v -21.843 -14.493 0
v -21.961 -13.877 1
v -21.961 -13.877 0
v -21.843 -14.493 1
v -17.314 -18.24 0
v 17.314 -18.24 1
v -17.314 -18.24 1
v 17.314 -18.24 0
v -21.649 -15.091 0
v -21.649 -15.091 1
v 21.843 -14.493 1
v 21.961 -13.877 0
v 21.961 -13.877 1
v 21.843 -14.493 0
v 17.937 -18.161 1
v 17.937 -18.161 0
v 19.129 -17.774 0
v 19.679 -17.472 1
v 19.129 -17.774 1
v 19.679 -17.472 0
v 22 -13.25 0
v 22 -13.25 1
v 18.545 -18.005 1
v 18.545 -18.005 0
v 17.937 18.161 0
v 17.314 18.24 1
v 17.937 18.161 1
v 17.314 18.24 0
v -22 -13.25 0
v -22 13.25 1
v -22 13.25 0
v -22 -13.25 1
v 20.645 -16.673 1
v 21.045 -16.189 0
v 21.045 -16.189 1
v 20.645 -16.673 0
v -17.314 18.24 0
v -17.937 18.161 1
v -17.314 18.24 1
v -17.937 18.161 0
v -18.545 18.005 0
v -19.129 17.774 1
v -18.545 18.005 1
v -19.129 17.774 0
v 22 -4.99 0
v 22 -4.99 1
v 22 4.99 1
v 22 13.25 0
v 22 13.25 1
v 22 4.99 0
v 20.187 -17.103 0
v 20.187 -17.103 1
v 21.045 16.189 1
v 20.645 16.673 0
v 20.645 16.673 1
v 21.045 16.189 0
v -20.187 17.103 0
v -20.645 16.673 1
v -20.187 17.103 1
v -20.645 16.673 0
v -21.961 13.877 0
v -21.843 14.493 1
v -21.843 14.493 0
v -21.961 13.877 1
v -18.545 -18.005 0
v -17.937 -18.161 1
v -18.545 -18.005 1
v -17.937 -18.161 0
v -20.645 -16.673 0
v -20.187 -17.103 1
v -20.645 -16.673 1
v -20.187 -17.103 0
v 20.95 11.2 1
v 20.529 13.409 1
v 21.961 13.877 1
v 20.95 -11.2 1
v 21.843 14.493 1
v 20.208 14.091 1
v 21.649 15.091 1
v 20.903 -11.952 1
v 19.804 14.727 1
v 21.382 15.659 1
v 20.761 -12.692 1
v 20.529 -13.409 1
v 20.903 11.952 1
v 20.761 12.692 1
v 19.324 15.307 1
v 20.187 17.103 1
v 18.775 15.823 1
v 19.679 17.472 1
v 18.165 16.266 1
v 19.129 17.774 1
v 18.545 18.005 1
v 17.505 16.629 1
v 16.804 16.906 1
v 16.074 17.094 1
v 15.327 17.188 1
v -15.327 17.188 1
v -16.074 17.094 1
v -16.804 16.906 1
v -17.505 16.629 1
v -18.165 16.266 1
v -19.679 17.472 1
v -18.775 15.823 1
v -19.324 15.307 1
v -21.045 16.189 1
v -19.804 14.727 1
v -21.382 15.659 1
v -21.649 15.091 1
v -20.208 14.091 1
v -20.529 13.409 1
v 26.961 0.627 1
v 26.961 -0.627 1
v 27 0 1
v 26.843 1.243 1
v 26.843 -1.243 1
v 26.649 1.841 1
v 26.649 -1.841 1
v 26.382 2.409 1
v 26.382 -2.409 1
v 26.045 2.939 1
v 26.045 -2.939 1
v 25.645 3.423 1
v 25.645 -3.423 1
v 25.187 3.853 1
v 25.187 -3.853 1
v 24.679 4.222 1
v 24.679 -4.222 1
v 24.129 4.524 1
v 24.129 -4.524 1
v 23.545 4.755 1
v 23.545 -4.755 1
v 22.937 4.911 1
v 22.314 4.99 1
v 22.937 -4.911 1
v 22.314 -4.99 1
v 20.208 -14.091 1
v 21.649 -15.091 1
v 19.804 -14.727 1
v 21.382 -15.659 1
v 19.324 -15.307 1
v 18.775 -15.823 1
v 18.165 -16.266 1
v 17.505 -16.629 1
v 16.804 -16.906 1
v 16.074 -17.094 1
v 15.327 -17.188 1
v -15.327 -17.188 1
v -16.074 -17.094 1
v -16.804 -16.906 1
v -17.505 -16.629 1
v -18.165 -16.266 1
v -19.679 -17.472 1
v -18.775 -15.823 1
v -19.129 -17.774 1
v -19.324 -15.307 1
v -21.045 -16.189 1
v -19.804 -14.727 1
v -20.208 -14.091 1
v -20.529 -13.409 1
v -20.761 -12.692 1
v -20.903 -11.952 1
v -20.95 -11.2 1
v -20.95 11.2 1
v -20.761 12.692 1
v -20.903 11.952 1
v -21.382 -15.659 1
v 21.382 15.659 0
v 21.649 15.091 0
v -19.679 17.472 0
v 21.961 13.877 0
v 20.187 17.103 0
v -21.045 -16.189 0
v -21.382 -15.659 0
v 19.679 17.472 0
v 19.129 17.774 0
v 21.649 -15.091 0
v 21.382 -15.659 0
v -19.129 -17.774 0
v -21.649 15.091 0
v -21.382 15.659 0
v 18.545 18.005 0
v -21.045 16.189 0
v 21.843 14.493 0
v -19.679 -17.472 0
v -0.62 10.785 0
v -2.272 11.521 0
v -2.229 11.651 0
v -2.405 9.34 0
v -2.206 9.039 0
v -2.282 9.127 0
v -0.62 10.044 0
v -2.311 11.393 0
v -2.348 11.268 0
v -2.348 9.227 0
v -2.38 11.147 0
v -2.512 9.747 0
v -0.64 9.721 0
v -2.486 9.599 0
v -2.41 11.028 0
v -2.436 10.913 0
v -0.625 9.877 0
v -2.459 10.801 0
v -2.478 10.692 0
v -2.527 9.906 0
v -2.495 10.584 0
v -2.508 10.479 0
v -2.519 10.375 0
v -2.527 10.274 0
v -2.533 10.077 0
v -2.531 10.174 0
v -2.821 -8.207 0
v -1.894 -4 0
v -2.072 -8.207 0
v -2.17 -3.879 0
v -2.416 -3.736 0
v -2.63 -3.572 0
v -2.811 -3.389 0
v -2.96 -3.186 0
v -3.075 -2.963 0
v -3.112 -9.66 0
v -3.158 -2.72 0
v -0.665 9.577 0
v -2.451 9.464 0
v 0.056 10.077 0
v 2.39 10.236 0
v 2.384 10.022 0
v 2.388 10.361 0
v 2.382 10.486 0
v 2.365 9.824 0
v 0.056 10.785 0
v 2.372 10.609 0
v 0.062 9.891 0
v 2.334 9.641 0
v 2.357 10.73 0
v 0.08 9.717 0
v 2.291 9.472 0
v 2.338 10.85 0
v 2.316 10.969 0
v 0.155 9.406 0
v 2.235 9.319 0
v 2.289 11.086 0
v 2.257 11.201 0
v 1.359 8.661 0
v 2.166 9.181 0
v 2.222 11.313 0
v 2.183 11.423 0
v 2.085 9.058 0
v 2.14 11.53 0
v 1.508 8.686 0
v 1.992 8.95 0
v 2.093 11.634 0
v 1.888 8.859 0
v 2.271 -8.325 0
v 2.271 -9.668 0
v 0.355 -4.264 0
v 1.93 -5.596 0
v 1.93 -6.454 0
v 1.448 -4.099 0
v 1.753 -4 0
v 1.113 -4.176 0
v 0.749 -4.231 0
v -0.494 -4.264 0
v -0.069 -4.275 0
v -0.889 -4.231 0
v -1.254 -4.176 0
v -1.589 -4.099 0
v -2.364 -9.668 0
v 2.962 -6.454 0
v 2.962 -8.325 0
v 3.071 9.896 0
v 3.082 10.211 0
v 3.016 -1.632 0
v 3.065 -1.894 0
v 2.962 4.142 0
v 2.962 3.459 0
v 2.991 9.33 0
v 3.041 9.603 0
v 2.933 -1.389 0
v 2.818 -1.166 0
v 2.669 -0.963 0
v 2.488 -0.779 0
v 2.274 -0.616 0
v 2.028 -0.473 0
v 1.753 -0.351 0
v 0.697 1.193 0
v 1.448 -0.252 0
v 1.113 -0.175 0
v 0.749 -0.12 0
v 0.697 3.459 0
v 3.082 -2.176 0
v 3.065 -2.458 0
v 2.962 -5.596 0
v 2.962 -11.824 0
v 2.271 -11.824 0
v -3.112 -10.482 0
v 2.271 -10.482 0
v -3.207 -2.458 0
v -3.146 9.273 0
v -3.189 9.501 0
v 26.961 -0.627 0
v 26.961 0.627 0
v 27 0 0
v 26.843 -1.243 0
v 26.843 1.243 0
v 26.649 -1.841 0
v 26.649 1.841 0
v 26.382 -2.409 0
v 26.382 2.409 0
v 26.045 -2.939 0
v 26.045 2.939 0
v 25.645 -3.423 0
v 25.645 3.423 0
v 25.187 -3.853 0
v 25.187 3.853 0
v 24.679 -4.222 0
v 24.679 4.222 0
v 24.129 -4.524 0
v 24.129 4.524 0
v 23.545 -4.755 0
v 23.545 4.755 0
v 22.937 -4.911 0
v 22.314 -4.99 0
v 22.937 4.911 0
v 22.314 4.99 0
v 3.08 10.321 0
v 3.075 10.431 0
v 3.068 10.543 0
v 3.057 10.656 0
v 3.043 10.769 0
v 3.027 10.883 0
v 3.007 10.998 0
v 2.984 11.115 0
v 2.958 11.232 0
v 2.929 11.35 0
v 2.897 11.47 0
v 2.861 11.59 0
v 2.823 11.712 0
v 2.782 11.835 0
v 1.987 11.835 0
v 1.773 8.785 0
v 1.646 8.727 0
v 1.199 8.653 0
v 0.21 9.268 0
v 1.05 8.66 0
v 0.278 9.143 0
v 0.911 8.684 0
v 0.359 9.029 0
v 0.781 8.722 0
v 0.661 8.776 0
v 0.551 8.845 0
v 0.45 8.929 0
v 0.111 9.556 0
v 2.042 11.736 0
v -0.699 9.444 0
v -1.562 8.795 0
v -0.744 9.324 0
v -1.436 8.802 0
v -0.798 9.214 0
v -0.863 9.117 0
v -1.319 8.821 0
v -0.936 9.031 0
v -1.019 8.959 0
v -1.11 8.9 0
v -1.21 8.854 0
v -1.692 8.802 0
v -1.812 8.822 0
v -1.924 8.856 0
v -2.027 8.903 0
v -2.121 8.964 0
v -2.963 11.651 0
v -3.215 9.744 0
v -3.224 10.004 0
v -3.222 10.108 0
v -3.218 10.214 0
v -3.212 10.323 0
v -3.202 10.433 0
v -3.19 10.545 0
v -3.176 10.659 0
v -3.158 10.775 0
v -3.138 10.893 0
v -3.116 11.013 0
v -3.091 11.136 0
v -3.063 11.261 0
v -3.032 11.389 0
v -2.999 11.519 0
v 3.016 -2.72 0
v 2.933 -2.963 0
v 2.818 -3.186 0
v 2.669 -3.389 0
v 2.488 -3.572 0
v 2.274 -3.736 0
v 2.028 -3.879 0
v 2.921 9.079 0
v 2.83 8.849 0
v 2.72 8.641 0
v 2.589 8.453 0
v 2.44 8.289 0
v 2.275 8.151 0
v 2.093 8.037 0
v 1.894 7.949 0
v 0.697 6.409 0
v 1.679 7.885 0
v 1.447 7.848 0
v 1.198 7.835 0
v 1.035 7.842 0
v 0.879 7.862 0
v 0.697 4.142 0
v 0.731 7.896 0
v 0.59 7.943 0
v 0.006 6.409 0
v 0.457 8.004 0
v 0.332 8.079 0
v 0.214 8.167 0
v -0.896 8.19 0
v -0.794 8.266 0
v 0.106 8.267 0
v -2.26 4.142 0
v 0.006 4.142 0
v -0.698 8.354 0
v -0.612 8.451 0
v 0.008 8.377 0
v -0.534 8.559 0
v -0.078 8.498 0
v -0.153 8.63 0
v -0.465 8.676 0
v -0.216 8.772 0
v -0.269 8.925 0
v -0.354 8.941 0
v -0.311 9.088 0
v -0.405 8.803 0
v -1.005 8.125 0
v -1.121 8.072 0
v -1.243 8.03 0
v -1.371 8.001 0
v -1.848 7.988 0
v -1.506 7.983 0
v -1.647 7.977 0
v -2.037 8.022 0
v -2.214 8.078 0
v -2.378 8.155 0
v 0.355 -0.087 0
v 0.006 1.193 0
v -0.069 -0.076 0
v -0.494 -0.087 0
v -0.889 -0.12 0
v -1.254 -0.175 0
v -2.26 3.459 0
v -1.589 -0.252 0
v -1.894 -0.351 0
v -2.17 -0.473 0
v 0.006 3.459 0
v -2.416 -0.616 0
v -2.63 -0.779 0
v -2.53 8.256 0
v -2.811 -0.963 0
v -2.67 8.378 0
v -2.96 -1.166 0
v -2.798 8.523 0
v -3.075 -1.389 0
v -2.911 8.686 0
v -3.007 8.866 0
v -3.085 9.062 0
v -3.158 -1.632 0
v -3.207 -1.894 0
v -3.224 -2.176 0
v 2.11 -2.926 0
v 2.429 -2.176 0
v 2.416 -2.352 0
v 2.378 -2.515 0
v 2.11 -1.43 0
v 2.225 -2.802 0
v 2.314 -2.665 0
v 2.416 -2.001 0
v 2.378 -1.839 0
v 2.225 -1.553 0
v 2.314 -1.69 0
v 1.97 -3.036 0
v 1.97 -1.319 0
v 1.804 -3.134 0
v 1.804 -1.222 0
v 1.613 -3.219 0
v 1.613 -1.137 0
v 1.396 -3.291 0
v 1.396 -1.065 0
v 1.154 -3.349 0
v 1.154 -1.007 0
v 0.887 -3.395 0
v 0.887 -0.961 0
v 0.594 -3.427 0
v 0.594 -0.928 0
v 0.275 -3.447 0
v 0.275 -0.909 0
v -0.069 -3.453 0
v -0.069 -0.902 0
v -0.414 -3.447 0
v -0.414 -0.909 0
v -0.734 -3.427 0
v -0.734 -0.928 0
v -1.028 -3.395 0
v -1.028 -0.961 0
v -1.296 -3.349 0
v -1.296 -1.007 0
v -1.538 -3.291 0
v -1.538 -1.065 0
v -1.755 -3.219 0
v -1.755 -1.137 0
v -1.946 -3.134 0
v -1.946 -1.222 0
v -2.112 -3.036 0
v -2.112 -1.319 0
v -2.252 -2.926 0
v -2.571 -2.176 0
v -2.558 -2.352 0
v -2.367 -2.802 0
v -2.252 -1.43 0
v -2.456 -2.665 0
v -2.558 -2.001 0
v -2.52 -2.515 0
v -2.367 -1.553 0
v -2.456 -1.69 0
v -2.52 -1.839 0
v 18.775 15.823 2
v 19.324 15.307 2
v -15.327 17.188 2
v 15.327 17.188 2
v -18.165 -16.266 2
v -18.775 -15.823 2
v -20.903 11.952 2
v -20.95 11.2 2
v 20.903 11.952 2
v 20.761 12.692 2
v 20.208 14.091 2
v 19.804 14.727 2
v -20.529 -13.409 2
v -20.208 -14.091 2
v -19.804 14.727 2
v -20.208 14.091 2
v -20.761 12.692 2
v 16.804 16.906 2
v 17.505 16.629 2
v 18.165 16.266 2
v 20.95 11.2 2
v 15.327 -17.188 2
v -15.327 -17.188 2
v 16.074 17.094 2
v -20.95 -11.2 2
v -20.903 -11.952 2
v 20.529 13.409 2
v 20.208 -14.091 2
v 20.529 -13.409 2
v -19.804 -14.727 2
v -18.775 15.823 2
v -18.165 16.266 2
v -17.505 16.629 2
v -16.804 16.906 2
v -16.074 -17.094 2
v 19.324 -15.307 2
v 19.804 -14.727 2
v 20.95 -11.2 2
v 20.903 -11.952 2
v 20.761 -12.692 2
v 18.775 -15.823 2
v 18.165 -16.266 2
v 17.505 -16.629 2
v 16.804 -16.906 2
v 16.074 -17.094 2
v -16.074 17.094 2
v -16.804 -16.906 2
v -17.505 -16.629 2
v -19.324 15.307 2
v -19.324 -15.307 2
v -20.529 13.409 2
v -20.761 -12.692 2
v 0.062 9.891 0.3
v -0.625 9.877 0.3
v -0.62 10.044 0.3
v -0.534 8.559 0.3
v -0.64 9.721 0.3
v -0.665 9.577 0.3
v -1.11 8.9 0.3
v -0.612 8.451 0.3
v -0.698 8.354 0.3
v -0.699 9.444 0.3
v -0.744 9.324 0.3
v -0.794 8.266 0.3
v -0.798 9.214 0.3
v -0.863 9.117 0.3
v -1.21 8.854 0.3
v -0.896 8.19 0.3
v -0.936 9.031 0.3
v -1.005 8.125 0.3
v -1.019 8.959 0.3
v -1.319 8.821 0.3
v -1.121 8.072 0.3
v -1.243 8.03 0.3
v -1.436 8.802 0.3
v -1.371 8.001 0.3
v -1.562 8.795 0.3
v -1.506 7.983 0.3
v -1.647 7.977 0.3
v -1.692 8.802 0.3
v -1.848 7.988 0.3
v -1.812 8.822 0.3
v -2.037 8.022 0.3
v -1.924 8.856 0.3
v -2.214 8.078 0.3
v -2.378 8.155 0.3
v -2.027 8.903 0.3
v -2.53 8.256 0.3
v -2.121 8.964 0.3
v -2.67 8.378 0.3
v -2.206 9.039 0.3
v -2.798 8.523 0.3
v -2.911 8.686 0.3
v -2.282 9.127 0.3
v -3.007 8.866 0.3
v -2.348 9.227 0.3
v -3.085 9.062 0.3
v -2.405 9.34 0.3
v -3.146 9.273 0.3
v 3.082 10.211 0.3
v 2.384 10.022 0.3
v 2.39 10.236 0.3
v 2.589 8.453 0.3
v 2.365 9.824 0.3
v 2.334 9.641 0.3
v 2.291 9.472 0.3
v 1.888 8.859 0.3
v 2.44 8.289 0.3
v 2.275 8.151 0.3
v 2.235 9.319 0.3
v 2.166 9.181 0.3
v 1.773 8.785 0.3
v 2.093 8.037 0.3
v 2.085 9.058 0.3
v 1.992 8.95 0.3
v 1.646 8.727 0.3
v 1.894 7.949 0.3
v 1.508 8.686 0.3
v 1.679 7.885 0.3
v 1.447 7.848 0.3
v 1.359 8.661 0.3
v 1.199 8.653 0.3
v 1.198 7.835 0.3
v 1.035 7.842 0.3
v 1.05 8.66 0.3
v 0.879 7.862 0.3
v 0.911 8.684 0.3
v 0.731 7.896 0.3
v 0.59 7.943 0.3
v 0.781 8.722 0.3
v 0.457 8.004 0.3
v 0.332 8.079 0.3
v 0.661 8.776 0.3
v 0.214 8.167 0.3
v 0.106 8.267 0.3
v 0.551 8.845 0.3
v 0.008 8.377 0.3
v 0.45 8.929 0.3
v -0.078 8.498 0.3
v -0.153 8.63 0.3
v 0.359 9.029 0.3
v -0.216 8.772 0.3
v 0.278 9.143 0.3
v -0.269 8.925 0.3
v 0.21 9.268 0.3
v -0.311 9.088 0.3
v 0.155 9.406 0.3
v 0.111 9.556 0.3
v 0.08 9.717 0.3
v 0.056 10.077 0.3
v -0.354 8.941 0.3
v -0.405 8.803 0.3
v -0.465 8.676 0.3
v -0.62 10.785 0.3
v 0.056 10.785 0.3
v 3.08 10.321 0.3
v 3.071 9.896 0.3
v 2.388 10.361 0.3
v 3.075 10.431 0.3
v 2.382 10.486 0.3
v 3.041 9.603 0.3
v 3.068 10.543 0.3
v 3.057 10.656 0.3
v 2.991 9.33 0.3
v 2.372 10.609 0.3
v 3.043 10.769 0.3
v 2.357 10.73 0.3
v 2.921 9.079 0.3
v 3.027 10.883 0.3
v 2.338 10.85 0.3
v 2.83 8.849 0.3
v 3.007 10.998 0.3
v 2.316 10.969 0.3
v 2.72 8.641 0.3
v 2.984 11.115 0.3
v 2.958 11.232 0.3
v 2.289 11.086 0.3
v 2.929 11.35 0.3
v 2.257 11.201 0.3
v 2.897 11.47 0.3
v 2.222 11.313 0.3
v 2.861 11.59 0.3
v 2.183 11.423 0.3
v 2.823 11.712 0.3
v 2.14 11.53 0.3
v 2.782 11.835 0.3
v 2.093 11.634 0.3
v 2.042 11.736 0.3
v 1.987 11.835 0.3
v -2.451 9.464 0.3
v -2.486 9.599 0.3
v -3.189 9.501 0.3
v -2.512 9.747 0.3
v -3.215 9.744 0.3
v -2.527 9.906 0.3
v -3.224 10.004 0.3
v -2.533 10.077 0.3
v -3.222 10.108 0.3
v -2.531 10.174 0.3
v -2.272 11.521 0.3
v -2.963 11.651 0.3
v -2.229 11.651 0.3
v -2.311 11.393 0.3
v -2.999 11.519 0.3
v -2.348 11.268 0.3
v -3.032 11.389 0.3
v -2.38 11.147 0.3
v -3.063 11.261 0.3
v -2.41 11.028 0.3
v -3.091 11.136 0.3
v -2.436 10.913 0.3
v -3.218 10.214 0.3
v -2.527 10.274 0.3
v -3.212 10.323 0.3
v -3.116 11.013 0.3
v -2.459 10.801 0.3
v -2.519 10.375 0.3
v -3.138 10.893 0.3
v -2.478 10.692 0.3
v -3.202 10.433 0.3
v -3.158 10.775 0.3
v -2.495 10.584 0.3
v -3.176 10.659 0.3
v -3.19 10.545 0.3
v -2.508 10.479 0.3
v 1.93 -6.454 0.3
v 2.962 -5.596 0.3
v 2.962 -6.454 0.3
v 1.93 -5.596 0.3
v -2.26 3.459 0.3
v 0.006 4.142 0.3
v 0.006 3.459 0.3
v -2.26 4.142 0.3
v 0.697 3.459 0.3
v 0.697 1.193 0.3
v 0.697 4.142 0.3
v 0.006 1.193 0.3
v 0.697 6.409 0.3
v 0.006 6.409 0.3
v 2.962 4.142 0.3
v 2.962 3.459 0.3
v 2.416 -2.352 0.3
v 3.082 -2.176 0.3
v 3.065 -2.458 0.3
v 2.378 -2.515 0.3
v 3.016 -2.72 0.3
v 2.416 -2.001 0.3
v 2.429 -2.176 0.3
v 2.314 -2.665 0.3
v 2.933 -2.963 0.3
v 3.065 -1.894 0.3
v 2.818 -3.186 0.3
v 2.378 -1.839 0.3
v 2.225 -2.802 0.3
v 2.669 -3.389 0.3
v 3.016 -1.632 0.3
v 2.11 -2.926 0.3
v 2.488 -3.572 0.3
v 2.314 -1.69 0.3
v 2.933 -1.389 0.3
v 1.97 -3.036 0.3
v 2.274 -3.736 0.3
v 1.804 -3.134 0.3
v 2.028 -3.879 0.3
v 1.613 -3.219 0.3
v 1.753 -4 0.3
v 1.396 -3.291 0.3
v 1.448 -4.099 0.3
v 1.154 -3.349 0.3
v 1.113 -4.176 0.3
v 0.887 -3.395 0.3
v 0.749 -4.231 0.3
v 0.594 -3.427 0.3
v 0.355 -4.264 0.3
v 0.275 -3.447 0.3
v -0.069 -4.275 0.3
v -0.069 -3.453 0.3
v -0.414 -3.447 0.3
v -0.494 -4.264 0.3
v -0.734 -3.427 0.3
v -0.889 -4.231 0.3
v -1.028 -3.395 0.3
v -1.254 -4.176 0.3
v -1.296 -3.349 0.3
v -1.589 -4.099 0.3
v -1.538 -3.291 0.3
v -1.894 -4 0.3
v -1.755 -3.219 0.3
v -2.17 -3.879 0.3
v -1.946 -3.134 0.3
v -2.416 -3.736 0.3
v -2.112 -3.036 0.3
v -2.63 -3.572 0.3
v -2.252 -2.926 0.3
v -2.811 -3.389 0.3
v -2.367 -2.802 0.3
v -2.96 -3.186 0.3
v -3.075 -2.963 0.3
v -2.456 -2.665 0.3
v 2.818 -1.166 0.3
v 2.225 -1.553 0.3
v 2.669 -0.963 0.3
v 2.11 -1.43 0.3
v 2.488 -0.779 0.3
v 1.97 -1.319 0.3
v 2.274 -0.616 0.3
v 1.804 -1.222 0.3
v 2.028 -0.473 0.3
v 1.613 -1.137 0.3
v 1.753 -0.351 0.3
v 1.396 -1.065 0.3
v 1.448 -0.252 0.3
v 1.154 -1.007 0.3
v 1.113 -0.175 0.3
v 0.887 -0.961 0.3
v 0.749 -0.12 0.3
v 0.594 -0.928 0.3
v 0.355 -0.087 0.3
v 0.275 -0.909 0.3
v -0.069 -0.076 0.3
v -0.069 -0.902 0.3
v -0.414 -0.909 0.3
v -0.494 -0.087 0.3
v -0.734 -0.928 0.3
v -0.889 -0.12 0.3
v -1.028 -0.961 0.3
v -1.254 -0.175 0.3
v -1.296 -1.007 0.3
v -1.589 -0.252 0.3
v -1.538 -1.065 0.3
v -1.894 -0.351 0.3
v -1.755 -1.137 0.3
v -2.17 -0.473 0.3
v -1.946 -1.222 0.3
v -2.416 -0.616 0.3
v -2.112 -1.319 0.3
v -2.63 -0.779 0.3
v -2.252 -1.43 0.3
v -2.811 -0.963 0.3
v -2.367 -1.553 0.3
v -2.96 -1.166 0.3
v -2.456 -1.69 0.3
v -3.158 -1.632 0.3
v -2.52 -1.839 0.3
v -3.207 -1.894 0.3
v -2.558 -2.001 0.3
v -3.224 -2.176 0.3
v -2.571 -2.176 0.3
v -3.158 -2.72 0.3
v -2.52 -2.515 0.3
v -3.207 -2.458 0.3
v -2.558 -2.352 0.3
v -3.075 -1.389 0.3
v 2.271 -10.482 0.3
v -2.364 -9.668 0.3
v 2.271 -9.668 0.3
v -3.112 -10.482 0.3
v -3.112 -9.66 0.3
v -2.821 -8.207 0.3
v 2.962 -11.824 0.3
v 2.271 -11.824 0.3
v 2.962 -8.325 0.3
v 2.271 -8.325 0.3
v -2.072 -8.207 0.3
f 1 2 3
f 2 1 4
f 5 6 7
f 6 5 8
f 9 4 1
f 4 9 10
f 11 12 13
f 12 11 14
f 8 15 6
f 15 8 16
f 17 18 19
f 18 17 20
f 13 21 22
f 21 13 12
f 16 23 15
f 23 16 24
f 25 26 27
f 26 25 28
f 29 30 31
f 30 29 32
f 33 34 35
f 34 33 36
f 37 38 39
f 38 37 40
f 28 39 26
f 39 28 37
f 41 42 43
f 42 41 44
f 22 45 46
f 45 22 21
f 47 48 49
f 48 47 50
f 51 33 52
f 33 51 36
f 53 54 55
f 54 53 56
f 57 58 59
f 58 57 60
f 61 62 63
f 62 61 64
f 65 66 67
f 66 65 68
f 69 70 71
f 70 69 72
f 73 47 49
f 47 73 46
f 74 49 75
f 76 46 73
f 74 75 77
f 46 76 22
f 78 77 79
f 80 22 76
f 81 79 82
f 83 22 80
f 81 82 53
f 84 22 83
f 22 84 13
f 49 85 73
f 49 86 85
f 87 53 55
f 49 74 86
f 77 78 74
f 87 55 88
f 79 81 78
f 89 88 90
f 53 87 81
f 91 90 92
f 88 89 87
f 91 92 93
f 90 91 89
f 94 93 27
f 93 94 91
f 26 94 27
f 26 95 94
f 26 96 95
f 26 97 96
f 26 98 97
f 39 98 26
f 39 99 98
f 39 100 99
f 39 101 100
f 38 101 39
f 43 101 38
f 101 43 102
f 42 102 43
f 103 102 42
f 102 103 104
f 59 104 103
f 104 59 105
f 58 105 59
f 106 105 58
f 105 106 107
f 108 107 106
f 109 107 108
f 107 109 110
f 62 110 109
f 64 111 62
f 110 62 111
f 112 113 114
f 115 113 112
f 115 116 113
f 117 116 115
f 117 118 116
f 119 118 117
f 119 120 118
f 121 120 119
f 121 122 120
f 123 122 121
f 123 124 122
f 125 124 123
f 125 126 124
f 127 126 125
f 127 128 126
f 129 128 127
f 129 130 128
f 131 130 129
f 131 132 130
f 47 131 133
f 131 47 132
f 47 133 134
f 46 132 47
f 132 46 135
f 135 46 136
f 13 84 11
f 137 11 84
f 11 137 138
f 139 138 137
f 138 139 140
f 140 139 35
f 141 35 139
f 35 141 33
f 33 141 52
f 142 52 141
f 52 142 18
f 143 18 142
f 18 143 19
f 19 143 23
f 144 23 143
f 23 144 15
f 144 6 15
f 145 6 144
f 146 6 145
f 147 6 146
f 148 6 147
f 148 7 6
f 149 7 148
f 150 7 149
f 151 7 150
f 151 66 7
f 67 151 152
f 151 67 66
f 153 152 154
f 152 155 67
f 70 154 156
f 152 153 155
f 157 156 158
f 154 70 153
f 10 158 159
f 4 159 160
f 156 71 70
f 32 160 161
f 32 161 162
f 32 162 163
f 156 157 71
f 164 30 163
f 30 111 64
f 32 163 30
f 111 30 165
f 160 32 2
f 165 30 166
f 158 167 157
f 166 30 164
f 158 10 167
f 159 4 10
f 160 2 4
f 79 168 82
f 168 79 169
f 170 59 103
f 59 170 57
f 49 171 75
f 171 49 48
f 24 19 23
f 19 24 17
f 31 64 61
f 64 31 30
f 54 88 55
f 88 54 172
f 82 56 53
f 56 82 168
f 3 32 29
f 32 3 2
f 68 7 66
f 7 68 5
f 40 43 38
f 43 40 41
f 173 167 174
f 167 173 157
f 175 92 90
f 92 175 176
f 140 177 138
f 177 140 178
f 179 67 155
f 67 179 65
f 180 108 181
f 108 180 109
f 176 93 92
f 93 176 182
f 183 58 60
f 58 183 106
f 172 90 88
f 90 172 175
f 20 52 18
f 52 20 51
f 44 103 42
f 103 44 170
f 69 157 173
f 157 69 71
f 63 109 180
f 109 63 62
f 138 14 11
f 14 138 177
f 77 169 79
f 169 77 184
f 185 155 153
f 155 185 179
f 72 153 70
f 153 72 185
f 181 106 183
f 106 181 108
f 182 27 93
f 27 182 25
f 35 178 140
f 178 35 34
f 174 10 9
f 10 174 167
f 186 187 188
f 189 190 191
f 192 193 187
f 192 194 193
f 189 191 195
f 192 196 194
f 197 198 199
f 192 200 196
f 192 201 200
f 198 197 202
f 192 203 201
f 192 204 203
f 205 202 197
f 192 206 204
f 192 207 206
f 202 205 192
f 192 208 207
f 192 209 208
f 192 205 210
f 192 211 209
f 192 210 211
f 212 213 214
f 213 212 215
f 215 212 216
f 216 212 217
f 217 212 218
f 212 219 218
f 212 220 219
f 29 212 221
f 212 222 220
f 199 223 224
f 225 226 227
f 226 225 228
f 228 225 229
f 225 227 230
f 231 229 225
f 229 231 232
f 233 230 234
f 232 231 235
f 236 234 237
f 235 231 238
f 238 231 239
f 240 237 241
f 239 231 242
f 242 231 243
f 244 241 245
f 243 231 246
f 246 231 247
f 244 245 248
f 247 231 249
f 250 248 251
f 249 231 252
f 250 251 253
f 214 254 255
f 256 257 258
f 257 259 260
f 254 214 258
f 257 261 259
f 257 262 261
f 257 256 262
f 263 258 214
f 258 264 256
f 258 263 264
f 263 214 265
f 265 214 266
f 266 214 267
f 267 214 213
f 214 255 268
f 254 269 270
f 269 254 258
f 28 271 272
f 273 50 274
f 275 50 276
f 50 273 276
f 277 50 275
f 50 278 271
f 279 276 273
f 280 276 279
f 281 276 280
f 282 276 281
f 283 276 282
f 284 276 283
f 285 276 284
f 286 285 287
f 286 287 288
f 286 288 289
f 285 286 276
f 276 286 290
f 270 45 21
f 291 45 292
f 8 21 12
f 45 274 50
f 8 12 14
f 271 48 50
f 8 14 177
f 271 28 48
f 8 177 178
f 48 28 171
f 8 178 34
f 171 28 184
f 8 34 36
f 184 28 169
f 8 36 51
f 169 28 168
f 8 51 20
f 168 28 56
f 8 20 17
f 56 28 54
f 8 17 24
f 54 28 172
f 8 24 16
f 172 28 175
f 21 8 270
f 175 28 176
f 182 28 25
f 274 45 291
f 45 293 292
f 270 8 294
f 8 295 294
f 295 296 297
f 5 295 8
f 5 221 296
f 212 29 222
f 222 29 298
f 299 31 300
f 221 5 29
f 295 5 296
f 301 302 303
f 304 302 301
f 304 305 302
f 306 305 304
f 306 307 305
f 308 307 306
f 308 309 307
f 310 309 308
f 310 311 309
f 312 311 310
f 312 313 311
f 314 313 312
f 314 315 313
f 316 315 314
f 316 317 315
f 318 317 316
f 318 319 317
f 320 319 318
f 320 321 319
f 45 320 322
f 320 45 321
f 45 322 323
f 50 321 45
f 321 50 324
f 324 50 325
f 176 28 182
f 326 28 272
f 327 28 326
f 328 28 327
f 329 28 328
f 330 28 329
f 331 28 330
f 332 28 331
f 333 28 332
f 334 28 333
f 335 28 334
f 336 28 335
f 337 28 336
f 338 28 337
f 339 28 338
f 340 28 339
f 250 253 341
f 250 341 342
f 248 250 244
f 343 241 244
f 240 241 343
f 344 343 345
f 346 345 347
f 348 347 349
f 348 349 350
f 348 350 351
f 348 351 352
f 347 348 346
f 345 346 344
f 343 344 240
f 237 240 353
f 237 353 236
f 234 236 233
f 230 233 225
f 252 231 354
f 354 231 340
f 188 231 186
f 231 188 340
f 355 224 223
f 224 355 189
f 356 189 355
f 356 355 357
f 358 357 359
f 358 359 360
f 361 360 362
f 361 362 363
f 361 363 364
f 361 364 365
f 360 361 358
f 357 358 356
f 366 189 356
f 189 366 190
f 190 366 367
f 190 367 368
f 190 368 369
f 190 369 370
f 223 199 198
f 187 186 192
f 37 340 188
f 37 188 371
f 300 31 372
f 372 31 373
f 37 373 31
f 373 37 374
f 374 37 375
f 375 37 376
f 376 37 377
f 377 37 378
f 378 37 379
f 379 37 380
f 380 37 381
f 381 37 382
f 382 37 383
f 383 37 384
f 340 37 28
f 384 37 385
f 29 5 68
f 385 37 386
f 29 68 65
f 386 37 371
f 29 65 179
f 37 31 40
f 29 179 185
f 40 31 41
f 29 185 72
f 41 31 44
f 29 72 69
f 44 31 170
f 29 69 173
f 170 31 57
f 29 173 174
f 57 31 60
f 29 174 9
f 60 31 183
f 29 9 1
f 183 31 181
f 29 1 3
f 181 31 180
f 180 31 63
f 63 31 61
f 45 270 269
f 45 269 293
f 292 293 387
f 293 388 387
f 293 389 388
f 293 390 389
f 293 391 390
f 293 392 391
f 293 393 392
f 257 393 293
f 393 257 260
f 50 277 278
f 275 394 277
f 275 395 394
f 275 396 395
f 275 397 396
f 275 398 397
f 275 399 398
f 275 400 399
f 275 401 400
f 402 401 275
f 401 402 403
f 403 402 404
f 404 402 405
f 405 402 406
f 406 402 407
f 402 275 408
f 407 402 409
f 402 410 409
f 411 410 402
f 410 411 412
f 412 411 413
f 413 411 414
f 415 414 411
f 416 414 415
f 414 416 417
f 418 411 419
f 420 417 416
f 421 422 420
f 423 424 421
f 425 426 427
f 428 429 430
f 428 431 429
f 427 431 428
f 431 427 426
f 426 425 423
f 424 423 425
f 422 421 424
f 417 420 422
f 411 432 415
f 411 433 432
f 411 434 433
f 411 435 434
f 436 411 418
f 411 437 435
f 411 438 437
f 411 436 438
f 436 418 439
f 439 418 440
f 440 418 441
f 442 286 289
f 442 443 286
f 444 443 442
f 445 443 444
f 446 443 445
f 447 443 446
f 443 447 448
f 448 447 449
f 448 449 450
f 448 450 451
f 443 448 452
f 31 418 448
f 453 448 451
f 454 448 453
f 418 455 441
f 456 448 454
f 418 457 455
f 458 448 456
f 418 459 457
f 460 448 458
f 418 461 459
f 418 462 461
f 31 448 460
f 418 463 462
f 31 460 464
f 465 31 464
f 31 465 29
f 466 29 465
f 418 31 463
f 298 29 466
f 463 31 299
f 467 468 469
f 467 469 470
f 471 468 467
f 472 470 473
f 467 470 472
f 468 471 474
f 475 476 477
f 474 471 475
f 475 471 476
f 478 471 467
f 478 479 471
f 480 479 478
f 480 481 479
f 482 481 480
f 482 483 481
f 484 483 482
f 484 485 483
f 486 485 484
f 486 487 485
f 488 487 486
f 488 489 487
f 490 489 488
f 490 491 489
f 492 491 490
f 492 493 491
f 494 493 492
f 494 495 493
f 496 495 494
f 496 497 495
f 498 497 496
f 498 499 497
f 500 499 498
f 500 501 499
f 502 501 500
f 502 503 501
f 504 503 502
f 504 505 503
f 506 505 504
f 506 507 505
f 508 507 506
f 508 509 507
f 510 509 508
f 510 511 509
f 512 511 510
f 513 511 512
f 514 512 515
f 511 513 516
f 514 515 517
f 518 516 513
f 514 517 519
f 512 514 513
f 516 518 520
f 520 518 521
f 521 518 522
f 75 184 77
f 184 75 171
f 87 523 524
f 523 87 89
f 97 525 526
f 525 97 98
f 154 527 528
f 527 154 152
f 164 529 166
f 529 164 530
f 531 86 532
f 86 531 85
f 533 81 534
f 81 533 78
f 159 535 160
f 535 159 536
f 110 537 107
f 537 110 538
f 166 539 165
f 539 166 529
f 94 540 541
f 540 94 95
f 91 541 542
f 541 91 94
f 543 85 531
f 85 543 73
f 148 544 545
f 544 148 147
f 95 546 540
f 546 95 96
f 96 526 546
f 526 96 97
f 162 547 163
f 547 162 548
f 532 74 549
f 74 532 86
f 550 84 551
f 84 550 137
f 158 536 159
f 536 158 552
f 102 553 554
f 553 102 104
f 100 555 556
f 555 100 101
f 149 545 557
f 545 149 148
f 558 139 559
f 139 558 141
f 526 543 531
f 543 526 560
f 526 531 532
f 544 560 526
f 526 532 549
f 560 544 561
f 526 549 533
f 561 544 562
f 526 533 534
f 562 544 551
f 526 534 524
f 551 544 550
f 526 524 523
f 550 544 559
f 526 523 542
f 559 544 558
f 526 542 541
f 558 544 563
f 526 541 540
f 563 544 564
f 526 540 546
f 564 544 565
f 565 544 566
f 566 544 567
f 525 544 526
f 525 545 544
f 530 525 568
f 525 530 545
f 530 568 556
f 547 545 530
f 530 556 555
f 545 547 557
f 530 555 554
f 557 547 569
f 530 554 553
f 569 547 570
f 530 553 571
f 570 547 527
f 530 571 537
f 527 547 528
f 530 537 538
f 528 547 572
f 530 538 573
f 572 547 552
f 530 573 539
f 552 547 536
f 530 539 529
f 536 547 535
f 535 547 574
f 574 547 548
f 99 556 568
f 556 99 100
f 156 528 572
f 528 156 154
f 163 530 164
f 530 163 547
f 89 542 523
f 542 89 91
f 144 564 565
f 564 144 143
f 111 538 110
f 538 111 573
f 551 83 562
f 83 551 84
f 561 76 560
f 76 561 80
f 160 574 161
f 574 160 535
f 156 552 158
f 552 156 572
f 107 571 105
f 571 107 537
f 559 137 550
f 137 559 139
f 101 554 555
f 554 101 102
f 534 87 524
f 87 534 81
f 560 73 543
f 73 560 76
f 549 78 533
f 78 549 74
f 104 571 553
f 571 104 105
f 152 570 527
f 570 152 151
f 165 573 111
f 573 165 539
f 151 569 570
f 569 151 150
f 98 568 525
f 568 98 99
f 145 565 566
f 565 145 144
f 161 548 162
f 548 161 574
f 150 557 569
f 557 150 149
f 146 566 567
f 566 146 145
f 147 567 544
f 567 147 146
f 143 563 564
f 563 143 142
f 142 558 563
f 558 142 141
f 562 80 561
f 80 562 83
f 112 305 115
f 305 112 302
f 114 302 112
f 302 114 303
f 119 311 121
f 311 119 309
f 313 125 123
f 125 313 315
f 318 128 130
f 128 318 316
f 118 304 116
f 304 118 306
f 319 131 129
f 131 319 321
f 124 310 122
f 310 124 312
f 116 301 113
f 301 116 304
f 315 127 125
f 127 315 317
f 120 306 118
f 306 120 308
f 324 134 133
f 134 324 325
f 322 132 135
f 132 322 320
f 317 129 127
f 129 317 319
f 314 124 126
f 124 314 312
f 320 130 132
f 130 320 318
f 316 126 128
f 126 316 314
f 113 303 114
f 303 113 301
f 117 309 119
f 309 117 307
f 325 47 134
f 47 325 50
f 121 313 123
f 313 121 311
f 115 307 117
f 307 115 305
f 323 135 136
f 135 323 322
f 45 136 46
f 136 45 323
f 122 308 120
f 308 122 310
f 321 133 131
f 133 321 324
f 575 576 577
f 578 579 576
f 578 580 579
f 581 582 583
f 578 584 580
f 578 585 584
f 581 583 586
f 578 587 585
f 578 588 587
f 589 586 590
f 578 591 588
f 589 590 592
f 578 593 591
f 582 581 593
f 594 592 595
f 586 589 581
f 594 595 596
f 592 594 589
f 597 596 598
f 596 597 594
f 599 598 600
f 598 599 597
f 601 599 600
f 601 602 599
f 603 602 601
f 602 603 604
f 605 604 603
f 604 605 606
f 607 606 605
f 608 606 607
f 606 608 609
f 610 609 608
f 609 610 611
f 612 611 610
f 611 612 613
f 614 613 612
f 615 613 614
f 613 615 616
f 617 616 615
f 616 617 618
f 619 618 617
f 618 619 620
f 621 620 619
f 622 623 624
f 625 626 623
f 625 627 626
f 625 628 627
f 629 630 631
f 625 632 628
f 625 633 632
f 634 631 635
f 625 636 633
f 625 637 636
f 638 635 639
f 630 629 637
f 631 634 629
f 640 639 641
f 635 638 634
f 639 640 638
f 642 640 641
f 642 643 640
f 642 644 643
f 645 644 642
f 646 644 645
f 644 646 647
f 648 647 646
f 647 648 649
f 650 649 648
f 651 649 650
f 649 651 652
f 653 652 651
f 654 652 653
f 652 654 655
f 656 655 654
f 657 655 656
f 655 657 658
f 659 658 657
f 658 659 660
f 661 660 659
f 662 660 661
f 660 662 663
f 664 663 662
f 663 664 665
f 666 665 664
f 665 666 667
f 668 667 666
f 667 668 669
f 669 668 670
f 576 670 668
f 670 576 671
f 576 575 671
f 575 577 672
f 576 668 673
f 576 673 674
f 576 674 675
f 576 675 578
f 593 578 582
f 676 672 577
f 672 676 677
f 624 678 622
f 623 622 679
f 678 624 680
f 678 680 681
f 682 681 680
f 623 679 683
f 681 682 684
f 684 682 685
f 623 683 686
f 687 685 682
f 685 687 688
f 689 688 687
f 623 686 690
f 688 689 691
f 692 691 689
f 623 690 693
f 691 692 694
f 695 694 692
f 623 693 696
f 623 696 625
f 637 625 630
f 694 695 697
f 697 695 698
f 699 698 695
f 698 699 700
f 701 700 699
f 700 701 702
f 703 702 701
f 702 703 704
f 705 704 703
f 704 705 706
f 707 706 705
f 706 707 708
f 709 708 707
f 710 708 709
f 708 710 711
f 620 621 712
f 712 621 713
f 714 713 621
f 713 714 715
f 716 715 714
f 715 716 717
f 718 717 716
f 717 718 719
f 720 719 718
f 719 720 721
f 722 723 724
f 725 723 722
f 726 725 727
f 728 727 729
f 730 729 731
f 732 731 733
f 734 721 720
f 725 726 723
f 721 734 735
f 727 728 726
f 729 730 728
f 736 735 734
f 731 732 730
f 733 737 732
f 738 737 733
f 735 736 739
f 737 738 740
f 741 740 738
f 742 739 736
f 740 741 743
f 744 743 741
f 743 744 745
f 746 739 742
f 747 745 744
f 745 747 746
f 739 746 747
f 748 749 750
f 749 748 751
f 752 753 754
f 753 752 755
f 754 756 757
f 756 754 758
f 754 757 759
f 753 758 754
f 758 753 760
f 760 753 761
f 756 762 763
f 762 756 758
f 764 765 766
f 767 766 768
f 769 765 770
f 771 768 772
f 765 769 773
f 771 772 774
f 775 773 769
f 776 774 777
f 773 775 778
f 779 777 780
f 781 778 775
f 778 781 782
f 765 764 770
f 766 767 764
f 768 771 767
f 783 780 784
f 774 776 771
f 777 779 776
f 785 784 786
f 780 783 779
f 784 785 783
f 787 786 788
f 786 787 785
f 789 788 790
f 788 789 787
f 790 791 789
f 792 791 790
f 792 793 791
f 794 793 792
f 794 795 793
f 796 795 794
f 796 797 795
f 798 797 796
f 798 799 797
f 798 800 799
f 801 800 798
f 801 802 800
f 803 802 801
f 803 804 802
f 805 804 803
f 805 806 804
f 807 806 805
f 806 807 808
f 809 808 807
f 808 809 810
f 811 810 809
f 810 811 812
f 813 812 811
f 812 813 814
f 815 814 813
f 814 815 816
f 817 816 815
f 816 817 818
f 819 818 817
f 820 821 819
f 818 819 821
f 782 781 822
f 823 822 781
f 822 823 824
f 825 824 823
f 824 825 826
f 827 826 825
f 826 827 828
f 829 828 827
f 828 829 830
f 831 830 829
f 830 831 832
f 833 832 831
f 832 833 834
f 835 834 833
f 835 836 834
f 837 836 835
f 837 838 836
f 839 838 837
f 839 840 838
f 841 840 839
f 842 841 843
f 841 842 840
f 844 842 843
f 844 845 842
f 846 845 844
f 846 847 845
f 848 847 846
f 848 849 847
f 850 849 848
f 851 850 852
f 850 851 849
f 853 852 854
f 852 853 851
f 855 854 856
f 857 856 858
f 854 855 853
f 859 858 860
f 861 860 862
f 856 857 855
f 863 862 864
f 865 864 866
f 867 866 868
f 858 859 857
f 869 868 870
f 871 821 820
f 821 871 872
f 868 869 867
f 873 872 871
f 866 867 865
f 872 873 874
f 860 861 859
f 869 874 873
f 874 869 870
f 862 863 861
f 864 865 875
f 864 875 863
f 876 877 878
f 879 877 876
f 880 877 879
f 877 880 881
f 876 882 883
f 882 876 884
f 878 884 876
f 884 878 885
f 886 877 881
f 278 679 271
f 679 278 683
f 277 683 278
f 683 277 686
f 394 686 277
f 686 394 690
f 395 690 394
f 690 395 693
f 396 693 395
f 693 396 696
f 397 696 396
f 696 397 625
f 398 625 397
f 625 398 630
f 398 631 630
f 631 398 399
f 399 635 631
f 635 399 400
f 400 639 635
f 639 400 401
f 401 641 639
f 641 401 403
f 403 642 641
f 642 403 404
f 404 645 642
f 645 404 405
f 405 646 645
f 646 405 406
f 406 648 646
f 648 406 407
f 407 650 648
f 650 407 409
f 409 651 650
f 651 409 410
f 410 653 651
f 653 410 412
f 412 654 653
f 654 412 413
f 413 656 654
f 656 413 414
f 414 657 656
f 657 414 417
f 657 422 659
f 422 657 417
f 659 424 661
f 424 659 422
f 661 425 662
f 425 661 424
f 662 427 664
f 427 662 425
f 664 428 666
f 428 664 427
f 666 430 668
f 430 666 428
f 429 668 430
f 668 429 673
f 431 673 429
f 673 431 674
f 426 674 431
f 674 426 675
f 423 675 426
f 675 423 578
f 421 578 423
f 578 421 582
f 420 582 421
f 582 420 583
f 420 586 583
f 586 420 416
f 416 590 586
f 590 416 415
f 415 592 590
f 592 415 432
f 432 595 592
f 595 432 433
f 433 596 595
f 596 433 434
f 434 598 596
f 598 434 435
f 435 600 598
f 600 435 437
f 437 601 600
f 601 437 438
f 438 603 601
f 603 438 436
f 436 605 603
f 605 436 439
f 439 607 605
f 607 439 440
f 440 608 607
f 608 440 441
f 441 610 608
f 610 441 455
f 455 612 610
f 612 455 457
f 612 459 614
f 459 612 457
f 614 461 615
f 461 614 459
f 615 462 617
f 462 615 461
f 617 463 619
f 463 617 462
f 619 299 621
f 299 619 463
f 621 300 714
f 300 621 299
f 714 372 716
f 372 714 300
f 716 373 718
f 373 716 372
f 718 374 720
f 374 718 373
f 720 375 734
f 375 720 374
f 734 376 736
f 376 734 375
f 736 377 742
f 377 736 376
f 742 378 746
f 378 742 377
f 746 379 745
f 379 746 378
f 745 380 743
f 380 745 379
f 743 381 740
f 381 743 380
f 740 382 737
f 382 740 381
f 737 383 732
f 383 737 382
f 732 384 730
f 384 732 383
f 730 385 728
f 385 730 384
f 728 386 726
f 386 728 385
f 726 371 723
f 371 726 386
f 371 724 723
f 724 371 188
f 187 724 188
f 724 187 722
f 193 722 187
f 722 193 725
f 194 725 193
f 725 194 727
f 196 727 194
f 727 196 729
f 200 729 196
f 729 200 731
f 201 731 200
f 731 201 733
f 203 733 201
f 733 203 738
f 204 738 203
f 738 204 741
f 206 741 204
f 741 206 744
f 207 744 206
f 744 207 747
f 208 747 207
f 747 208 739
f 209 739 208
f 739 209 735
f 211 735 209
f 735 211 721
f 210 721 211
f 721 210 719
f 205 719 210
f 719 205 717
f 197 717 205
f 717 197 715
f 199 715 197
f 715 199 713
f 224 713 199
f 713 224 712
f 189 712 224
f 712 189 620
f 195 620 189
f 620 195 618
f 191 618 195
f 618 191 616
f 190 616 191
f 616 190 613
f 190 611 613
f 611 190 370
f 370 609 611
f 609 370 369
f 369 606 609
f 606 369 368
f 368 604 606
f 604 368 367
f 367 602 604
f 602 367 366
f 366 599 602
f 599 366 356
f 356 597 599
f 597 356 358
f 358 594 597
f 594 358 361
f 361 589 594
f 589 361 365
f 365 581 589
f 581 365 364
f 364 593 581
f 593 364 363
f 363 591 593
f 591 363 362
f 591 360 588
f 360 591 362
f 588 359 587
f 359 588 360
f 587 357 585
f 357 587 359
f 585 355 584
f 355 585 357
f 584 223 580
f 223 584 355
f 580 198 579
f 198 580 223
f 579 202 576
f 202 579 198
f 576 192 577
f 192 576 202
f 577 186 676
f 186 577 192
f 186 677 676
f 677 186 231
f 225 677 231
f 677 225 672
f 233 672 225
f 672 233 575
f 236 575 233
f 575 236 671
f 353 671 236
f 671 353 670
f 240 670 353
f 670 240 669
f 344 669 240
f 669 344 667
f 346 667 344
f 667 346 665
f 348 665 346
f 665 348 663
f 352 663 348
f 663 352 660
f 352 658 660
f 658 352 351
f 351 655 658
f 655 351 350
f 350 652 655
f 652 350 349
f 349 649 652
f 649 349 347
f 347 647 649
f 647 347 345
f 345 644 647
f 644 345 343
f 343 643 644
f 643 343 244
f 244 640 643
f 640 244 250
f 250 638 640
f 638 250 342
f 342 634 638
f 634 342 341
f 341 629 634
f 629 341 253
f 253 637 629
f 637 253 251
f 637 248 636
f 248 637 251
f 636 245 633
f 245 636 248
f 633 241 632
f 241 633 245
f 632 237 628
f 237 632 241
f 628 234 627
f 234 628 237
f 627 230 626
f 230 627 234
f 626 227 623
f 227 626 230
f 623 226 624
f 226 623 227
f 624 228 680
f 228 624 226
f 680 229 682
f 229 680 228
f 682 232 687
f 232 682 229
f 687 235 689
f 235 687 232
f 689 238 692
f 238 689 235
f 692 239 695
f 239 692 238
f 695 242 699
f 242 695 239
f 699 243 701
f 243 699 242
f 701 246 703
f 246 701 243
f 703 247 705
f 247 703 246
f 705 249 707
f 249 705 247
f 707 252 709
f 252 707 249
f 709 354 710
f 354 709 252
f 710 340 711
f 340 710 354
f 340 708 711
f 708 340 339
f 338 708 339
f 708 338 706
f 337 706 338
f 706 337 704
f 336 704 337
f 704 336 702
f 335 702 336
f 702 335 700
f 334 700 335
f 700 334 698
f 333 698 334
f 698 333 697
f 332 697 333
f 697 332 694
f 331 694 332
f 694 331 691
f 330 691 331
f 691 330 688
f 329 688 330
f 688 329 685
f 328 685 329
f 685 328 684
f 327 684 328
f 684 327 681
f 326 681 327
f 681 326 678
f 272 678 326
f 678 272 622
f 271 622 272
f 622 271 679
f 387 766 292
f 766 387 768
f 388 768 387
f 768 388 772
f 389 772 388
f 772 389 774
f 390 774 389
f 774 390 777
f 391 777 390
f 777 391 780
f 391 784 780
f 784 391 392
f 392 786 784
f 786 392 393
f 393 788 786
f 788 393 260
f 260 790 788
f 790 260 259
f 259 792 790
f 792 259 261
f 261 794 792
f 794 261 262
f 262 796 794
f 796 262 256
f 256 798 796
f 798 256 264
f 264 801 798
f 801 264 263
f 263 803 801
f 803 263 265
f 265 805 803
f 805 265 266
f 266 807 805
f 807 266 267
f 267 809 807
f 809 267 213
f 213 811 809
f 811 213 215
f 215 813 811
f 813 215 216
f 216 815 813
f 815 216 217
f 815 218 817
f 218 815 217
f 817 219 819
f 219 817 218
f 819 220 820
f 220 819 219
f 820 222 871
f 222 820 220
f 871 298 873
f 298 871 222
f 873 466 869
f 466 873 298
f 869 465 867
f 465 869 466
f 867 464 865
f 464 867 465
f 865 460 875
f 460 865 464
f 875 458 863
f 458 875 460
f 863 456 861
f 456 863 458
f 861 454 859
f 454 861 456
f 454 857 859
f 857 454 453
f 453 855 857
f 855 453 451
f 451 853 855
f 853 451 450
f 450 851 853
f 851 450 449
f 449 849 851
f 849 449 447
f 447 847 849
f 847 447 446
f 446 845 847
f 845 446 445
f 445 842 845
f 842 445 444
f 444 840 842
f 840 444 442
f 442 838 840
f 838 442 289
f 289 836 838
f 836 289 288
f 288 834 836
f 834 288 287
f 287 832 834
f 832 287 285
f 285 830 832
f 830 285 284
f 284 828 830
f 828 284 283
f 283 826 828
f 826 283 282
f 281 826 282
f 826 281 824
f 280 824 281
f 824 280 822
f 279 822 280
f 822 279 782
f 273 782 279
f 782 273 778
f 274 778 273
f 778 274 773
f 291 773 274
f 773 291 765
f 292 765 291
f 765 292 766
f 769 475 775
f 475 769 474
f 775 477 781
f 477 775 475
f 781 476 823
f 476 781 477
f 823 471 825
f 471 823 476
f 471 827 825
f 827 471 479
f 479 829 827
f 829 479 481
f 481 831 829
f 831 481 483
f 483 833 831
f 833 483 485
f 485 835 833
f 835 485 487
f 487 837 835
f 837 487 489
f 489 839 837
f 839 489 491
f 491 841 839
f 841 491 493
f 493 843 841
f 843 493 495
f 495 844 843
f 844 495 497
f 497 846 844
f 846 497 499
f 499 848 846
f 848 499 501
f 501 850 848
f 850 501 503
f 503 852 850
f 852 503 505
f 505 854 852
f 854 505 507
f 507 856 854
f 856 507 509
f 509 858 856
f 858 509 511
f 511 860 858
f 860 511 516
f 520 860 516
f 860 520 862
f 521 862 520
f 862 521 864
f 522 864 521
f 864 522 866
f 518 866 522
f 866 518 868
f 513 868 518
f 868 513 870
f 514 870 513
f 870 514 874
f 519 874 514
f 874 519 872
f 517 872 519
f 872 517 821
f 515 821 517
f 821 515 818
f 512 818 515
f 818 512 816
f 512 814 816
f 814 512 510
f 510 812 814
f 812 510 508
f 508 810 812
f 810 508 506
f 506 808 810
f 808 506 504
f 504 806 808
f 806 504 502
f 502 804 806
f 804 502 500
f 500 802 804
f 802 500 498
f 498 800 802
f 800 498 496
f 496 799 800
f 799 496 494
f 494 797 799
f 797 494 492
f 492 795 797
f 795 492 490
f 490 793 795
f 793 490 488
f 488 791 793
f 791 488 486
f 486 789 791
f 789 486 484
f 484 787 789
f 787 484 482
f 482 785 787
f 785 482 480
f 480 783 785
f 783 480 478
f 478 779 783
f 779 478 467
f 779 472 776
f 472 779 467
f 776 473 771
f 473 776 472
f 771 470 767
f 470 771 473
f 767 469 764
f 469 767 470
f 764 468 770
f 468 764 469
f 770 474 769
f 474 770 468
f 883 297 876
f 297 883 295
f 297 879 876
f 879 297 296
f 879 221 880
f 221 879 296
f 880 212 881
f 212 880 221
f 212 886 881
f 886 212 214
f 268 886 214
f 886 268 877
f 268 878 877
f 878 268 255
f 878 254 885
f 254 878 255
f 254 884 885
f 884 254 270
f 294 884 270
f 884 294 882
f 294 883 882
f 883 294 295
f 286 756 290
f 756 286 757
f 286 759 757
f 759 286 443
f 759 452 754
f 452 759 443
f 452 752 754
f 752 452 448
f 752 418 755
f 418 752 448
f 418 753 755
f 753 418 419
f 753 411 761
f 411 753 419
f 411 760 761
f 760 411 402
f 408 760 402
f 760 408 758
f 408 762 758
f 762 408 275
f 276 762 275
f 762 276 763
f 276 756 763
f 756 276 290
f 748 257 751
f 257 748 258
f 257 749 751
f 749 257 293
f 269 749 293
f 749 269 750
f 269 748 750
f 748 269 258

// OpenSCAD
$fn = 50;


difference() {
	union() {
		translate(v = [0, 0, 0]) {
			rotate(a = [0, 0, 0]) {
				hull() {
					translate(v = [-17.0000000000, 13.2500000000, 0]) {
						rotate(a = [0, 0, 0]) {
							translate(v = [0, 0, 0]) {
								rotate(a = [0, 0, 0]) {
									cylinder(h = 1, r = 5);
								}
							}
						}
					}
					translate(v = [17.0000000000, 13.2500000000, 0]) {
						rotate(a = [0, 0, 0]) {
							translate(v = [0, 0, 0]) {
								rotate(a = [0, 0, 0]) {
									cylinder(h = 1, r = 5);
								}
							}
						}
					}
					translate(v = [-17.0000000000, -13.2500000000, 0]) {
						rotate(a = [0, 0, 0]) {
							translate(v = [0, 0, 0]) {
								rotate(a = [0, 0, 0]) {
									cylinder(h = 1, r = 5);
								}
							}
						}
					}
					translate(v = [17.0000000000, -13.2500000000, 0]) {
						rotate(a = [0, 0, 0]) {
							translate(v = [0, 0, 0]) {
								rotate(a = [0, 0, 0]) {
									cylinder(h = 1, r = 5);
								}
							}
						}
					}
				}
			}
		}
		translate(v = [0, 0, 0]) {
			rotate(a = [0, 0, 0]) {
				hull() {
					translate(v = [-14.9500000000, 11.2000000000, 0]) {
						rotate(a = [0, 0, 0]) {
							translate(v = [0, 0, 0]) {
								rotate(a = [0, 0, 0]) {
									cylinder(h = 2, r = 6);
								}
							}
						}
					}
					translate(v = [14.9500000000, 11.2000000000, 0]) {
						rotate(a = [0, 0, 0]) {
							translate(v = [0, 0, 0]) {
								rotate(a = [0, 0, 0]) {
									cylinder(h = 2, r = 6);
								}
							}
						}
					}
					translate(v = [-14.9500000000, -11.2000000000, 0]) {
						rotate(a = [0, 0, 0]) {
							translate(v = [0, 0, 0]) {
								rotate(a = [0, 0, 0]) {
									cylinder(h = 2, r = 6);
								}
							}
						}
					}
					translate(v = [14.9500000000, -11.2000000000, 0]) {
						rotate(a = [0, 0, 0]) {
							translate(v = [0, 0, 0]) {
								rotate(a = [0, 0, 0]) {
									cylinder(h = 2, r = 6);
								}
							}
						}
					}
				}
			}
		}
		translate(v = [22.0000000000, 0, 0.0000000000]) {
			rotate(a = [0, 0, 0]) {
				cylinder(h = 1, r = 5);
			}
		}
	}
	union() {
		translate(v = [0, 0, 0.3000000000]) {
			rotate(a = [0, 180, 90]) {
				linear_extrude(height = 0.3000000000) {
					text(font = "Candara:Light", halign = "center", size = 6, text = "3+0.1", valign = "center");
				}
			}
		}
	}
}
